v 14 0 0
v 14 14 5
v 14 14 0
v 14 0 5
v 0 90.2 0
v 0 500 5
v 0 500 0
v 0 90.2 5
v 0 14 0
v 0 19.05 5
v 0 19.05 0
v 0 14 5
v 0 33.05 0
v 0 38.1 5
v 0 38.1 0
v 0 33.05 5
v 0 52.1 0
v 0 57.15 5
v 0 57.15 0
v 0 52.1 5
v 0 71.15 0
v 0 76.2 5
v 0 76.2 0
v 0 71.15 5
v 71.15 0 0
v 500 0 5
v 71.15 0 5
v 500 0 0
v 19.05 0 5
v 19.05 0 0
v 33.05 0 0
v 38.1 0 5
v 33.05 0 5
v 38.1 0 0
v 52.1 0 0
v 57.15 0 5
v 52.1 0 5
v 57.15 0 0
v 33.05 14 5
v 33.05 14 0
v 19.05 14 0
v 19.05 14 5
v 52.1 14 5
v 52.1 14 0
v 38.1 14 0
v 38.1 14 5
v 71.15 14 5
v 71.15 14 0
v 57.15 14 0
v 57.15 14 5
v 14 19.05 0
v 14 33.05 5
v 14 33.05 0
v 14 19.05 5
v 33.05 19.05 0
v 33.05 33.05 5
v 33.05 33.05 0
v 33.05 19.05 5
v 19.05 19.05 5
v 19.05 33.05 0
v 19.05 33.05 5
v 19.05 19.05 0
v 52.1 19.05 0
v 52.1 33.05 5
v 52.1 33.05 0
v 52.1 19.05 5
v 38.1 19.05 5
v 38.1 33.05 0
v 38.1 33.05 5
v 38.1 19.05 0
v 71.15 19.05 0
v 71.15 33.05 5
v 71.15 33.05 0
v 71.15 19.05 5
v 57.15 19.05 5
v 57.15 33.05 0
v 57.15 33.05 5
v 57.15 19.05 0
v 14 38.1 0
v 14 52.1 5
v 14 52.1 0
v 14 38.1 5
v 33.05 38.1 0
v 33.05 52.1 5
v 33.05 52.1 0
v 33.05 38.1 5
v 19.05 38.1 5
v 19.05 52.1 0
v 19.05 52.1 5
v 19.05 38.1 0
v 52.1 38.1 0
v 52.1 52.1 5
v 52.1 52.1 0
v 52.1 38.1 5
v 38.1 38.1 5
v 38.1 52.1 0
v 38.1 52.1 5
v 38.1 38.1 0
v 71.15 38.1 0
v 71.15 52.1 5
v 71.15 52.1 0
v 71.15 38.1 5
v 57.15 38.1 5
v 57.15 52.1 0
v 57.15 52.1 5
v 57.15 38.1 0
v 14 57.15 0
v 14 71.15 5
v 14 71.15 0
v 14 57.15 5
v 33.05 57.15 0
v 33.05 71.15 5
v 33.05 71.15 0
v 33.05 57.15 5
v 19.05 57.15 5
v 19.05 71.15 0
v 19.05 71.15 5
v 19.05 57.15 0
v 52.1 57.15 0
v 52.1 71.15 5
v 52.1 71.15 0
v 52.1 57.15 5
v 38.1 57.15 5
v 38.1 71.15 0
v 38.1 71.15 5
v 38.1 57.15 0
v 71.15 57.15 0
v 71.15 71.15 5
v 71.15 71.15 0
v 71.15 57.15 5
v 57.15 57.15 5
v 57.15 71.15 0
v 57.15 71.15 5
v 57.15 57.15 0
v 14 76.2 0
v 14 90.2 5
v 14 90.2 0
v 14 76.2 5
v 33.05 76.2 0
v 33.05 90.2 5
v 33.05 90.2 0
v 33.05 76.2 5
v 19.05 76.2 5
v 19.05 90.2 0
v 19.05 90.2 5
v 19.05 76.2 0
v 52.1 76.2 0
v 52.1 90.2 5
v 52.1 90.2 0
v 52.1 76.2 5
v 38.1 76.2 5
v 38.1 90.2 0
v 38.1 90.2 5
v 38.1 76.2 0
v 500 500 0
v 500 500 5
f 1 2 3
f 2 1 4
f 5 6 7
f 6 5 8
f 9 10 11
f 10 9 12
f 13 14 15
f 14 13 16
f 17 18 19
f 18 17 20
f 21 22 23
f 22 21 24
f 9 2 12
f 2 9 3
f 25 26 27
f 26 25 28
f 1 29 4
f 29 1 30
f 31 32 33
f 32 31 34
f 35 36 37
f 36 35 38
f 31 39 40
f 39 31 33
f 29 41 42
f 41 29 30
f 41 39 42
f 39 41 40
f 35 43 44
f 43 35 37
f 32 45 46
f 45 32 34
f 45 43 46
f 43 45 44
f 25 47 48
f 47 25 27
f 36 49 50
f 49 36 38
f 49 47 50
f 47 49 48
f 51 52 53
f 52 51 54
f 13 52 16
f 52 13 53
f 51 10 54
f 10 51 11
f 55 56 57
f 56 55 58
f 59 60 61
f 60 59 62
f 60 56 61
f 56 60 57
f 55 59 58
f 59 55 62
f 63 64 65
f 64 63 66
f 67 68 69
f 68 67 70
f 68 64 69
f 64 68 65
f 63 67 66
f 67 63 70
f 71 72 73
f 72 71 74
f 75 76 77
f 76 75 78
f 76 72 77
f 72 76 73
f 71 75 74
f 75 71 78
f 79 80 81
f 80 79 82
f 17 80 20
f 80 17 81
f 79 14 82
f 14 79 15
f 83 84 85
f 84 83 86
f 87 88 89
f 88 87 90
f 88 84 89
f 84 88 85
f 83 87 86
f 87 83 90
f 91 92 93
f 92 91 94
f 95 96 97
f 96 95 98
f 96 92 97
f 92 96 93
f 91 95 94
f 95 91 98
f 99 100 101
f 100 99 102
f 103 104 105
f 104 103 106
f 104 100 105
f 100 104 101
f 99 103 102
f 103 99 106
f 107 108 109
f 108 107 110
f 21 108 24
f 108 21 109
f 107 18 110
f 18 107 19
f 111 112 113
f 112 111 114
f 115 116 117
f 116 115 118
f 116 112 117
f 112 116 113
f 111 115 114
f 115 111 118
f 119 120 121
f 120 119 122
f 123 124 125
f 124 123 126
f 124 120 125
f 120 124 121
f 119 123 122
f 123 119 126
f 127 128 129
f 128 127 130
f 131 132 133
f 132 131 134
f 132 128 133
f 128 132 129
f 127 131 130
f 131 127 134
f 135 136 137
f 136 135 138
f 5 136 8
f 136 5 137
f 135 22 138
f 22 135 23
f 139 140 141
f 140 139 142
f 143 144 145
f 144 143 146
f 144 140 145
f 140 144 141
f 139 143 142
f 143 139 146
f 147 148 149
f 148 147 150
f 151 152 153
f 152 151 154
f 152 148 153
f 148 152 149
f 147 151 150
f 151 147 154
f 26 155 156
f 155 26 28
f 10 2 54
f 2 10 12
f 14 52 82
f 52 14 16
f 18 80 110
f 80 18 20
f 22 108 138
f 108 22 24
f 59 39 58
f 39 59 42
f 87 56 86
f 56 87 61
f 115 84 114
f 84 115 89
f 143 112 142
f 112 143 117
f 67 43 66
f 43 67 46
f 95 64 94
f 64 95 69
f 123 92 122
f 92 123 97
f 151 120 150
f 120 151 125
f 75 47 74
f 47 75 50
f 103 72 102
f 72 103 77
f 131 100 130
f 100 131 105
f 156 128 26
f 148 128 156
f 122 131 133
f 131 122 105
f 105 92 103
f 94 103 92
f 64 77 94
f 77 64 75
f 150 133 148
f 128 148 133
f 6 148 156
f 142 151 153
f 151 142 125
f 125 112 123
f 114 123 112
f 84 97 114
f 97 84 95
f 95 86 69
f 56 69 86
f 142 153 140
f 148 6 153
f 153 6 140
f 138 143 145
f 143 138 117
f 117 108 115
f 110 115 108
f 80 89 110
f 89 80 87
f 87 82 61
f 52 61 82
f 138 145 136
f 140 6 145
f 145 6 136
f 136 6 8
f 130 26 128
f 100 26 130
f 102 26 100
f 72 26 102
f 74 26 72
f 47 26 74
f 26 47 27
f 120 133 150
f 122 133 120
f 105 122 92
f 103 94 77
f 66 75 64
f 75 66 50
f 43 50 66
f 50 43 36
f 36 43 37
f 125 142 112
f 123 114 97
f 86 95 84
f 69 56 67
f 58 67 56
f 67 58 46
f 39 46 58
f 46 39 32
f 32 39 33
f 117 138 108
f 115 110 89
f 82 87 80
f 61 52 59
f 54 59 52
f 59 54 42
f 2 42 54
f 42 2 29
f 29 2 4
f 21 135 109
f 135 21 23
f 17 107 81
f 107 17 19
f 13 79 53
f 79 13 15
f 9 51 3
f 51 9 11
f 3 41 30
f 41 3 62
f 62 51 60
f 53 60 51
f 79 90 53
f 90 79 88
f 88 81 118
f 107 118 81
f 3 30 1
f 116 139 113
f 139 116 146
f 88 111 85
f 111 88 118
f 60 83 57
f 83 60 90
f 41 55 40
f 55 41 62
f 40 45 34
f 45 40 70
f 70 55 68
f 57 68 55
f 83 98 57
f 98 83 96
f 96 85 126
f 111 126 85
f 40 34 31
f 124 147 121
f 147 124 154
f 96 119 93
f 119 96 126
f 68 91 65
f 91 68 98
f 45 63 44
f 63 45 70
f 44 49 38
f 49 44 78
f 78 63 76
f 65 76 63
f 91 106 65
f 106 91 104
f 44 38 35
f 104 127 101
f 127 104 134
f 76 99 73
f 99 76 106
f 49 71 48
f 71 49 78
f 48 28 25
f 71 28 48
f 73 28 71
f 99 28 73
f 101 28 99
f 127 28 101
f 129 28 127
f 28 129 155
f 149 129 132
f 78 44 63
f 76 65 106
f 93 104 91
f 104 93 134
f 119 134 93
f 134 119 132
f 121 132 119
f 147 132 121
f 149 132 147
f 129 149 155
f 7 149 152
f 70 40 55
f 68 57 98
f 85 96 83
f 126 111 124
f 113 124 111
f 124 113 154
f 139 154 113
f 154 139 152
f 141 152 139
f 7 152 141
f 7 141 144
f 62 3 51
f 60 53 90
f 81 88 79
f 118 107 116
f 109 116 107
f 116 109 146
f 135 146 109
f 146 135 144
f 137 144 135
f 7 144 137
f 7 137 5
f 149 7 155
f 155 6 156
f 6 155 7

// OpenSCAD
difference() {
	cube(size = [500, 500, 5]);
	translate(v = [0, 0, -0.5]) {
		union() {
			cube(size = [0, 0, 0]);
			translate(v = [0.0, 0, 0]) {
				cube(size = [14, 14, 6]);
			}
			translate(v = [19.05, 0, 0]) {
				cube(size = [14, 14, 6]);
			}
			translate(v = [38.1, 0, 0]) {
				cube(size = [14, 14, 6]);
			}
			translate(v = [57.150000000000006, 0, 0]) {
				cube(size = [14, 14, 6]);
			}
		}
	}
	translate(v = [0, 19.05, -0.5]) {
		union() {
			cube(size = [0, 0, 0]);
			translate(v = [0.0, 0, 0]) {
				cube(size = [14, 14, 6]);
			}
			translate(v = [19.05, 0, 0]) {
				cube(size = [14, 14, 6]);
			}
			translate(v = [38.1, 0, 0]) {
				cube(size = [14, 14, 6]);
			}
			translate(v = [57.150000000000006, 0, 0]) {
				cube(size = [14, 14, 6]);
			}
		}
	}
	translate(v = [0, 38.1, -0.5]) {
		union() {
			cube(size = [0, 0, 0]);
			translate(v = [0.0, 0, 0]) {
				cube(size = [14, 14, 6]);
			}
			translate(v = [19.05, 0, 0]) {
				cube(size = [14, 14, 6]);
			}
			translate(v = [38.1, 0, 0]) {
				cube(size = [14, 14, 6]);
			}
			translate(v = [57.150000000000006, 0, 0]) {
				cube(size = [14, 14, 6]);
			}
		}
	}
	translate(v = [0, 57.150000000000006, -0.5]) {
		union() {
			cube(size = [0, 0, 0]);
			translate(v = [0.0, 0, 0]) {
				cube(size = [14, 14, 6]);
			}
			translate(v = [19.05, 0, 0]) {
				cube(size = [14, 14, 6]);
			}
			translate(v = [38.1, 0, 0]) {
				cube(size = [14, 14, 6]);
			}
			translate(v = [57.150000000000006, 0, 0]) {
				cube(size = [14, 14, 6]);
			}
		}
	}
	translate(v = [0, 76.2, -0.5]) {
		union() {
			cube(size = [0, 0, 0]);
			translate(v = [0.0, 0, 0]) {
				cube(size = [14, 14, 6]);
			}
			translate(v = [19.05, 0, 0]) {
				cube(size = [14, 14, 6]);
			}
			translate(v = [38.1, 0, 0]) {
				cube(size = [14, 14, 6]);
			}
		}
	}
}
